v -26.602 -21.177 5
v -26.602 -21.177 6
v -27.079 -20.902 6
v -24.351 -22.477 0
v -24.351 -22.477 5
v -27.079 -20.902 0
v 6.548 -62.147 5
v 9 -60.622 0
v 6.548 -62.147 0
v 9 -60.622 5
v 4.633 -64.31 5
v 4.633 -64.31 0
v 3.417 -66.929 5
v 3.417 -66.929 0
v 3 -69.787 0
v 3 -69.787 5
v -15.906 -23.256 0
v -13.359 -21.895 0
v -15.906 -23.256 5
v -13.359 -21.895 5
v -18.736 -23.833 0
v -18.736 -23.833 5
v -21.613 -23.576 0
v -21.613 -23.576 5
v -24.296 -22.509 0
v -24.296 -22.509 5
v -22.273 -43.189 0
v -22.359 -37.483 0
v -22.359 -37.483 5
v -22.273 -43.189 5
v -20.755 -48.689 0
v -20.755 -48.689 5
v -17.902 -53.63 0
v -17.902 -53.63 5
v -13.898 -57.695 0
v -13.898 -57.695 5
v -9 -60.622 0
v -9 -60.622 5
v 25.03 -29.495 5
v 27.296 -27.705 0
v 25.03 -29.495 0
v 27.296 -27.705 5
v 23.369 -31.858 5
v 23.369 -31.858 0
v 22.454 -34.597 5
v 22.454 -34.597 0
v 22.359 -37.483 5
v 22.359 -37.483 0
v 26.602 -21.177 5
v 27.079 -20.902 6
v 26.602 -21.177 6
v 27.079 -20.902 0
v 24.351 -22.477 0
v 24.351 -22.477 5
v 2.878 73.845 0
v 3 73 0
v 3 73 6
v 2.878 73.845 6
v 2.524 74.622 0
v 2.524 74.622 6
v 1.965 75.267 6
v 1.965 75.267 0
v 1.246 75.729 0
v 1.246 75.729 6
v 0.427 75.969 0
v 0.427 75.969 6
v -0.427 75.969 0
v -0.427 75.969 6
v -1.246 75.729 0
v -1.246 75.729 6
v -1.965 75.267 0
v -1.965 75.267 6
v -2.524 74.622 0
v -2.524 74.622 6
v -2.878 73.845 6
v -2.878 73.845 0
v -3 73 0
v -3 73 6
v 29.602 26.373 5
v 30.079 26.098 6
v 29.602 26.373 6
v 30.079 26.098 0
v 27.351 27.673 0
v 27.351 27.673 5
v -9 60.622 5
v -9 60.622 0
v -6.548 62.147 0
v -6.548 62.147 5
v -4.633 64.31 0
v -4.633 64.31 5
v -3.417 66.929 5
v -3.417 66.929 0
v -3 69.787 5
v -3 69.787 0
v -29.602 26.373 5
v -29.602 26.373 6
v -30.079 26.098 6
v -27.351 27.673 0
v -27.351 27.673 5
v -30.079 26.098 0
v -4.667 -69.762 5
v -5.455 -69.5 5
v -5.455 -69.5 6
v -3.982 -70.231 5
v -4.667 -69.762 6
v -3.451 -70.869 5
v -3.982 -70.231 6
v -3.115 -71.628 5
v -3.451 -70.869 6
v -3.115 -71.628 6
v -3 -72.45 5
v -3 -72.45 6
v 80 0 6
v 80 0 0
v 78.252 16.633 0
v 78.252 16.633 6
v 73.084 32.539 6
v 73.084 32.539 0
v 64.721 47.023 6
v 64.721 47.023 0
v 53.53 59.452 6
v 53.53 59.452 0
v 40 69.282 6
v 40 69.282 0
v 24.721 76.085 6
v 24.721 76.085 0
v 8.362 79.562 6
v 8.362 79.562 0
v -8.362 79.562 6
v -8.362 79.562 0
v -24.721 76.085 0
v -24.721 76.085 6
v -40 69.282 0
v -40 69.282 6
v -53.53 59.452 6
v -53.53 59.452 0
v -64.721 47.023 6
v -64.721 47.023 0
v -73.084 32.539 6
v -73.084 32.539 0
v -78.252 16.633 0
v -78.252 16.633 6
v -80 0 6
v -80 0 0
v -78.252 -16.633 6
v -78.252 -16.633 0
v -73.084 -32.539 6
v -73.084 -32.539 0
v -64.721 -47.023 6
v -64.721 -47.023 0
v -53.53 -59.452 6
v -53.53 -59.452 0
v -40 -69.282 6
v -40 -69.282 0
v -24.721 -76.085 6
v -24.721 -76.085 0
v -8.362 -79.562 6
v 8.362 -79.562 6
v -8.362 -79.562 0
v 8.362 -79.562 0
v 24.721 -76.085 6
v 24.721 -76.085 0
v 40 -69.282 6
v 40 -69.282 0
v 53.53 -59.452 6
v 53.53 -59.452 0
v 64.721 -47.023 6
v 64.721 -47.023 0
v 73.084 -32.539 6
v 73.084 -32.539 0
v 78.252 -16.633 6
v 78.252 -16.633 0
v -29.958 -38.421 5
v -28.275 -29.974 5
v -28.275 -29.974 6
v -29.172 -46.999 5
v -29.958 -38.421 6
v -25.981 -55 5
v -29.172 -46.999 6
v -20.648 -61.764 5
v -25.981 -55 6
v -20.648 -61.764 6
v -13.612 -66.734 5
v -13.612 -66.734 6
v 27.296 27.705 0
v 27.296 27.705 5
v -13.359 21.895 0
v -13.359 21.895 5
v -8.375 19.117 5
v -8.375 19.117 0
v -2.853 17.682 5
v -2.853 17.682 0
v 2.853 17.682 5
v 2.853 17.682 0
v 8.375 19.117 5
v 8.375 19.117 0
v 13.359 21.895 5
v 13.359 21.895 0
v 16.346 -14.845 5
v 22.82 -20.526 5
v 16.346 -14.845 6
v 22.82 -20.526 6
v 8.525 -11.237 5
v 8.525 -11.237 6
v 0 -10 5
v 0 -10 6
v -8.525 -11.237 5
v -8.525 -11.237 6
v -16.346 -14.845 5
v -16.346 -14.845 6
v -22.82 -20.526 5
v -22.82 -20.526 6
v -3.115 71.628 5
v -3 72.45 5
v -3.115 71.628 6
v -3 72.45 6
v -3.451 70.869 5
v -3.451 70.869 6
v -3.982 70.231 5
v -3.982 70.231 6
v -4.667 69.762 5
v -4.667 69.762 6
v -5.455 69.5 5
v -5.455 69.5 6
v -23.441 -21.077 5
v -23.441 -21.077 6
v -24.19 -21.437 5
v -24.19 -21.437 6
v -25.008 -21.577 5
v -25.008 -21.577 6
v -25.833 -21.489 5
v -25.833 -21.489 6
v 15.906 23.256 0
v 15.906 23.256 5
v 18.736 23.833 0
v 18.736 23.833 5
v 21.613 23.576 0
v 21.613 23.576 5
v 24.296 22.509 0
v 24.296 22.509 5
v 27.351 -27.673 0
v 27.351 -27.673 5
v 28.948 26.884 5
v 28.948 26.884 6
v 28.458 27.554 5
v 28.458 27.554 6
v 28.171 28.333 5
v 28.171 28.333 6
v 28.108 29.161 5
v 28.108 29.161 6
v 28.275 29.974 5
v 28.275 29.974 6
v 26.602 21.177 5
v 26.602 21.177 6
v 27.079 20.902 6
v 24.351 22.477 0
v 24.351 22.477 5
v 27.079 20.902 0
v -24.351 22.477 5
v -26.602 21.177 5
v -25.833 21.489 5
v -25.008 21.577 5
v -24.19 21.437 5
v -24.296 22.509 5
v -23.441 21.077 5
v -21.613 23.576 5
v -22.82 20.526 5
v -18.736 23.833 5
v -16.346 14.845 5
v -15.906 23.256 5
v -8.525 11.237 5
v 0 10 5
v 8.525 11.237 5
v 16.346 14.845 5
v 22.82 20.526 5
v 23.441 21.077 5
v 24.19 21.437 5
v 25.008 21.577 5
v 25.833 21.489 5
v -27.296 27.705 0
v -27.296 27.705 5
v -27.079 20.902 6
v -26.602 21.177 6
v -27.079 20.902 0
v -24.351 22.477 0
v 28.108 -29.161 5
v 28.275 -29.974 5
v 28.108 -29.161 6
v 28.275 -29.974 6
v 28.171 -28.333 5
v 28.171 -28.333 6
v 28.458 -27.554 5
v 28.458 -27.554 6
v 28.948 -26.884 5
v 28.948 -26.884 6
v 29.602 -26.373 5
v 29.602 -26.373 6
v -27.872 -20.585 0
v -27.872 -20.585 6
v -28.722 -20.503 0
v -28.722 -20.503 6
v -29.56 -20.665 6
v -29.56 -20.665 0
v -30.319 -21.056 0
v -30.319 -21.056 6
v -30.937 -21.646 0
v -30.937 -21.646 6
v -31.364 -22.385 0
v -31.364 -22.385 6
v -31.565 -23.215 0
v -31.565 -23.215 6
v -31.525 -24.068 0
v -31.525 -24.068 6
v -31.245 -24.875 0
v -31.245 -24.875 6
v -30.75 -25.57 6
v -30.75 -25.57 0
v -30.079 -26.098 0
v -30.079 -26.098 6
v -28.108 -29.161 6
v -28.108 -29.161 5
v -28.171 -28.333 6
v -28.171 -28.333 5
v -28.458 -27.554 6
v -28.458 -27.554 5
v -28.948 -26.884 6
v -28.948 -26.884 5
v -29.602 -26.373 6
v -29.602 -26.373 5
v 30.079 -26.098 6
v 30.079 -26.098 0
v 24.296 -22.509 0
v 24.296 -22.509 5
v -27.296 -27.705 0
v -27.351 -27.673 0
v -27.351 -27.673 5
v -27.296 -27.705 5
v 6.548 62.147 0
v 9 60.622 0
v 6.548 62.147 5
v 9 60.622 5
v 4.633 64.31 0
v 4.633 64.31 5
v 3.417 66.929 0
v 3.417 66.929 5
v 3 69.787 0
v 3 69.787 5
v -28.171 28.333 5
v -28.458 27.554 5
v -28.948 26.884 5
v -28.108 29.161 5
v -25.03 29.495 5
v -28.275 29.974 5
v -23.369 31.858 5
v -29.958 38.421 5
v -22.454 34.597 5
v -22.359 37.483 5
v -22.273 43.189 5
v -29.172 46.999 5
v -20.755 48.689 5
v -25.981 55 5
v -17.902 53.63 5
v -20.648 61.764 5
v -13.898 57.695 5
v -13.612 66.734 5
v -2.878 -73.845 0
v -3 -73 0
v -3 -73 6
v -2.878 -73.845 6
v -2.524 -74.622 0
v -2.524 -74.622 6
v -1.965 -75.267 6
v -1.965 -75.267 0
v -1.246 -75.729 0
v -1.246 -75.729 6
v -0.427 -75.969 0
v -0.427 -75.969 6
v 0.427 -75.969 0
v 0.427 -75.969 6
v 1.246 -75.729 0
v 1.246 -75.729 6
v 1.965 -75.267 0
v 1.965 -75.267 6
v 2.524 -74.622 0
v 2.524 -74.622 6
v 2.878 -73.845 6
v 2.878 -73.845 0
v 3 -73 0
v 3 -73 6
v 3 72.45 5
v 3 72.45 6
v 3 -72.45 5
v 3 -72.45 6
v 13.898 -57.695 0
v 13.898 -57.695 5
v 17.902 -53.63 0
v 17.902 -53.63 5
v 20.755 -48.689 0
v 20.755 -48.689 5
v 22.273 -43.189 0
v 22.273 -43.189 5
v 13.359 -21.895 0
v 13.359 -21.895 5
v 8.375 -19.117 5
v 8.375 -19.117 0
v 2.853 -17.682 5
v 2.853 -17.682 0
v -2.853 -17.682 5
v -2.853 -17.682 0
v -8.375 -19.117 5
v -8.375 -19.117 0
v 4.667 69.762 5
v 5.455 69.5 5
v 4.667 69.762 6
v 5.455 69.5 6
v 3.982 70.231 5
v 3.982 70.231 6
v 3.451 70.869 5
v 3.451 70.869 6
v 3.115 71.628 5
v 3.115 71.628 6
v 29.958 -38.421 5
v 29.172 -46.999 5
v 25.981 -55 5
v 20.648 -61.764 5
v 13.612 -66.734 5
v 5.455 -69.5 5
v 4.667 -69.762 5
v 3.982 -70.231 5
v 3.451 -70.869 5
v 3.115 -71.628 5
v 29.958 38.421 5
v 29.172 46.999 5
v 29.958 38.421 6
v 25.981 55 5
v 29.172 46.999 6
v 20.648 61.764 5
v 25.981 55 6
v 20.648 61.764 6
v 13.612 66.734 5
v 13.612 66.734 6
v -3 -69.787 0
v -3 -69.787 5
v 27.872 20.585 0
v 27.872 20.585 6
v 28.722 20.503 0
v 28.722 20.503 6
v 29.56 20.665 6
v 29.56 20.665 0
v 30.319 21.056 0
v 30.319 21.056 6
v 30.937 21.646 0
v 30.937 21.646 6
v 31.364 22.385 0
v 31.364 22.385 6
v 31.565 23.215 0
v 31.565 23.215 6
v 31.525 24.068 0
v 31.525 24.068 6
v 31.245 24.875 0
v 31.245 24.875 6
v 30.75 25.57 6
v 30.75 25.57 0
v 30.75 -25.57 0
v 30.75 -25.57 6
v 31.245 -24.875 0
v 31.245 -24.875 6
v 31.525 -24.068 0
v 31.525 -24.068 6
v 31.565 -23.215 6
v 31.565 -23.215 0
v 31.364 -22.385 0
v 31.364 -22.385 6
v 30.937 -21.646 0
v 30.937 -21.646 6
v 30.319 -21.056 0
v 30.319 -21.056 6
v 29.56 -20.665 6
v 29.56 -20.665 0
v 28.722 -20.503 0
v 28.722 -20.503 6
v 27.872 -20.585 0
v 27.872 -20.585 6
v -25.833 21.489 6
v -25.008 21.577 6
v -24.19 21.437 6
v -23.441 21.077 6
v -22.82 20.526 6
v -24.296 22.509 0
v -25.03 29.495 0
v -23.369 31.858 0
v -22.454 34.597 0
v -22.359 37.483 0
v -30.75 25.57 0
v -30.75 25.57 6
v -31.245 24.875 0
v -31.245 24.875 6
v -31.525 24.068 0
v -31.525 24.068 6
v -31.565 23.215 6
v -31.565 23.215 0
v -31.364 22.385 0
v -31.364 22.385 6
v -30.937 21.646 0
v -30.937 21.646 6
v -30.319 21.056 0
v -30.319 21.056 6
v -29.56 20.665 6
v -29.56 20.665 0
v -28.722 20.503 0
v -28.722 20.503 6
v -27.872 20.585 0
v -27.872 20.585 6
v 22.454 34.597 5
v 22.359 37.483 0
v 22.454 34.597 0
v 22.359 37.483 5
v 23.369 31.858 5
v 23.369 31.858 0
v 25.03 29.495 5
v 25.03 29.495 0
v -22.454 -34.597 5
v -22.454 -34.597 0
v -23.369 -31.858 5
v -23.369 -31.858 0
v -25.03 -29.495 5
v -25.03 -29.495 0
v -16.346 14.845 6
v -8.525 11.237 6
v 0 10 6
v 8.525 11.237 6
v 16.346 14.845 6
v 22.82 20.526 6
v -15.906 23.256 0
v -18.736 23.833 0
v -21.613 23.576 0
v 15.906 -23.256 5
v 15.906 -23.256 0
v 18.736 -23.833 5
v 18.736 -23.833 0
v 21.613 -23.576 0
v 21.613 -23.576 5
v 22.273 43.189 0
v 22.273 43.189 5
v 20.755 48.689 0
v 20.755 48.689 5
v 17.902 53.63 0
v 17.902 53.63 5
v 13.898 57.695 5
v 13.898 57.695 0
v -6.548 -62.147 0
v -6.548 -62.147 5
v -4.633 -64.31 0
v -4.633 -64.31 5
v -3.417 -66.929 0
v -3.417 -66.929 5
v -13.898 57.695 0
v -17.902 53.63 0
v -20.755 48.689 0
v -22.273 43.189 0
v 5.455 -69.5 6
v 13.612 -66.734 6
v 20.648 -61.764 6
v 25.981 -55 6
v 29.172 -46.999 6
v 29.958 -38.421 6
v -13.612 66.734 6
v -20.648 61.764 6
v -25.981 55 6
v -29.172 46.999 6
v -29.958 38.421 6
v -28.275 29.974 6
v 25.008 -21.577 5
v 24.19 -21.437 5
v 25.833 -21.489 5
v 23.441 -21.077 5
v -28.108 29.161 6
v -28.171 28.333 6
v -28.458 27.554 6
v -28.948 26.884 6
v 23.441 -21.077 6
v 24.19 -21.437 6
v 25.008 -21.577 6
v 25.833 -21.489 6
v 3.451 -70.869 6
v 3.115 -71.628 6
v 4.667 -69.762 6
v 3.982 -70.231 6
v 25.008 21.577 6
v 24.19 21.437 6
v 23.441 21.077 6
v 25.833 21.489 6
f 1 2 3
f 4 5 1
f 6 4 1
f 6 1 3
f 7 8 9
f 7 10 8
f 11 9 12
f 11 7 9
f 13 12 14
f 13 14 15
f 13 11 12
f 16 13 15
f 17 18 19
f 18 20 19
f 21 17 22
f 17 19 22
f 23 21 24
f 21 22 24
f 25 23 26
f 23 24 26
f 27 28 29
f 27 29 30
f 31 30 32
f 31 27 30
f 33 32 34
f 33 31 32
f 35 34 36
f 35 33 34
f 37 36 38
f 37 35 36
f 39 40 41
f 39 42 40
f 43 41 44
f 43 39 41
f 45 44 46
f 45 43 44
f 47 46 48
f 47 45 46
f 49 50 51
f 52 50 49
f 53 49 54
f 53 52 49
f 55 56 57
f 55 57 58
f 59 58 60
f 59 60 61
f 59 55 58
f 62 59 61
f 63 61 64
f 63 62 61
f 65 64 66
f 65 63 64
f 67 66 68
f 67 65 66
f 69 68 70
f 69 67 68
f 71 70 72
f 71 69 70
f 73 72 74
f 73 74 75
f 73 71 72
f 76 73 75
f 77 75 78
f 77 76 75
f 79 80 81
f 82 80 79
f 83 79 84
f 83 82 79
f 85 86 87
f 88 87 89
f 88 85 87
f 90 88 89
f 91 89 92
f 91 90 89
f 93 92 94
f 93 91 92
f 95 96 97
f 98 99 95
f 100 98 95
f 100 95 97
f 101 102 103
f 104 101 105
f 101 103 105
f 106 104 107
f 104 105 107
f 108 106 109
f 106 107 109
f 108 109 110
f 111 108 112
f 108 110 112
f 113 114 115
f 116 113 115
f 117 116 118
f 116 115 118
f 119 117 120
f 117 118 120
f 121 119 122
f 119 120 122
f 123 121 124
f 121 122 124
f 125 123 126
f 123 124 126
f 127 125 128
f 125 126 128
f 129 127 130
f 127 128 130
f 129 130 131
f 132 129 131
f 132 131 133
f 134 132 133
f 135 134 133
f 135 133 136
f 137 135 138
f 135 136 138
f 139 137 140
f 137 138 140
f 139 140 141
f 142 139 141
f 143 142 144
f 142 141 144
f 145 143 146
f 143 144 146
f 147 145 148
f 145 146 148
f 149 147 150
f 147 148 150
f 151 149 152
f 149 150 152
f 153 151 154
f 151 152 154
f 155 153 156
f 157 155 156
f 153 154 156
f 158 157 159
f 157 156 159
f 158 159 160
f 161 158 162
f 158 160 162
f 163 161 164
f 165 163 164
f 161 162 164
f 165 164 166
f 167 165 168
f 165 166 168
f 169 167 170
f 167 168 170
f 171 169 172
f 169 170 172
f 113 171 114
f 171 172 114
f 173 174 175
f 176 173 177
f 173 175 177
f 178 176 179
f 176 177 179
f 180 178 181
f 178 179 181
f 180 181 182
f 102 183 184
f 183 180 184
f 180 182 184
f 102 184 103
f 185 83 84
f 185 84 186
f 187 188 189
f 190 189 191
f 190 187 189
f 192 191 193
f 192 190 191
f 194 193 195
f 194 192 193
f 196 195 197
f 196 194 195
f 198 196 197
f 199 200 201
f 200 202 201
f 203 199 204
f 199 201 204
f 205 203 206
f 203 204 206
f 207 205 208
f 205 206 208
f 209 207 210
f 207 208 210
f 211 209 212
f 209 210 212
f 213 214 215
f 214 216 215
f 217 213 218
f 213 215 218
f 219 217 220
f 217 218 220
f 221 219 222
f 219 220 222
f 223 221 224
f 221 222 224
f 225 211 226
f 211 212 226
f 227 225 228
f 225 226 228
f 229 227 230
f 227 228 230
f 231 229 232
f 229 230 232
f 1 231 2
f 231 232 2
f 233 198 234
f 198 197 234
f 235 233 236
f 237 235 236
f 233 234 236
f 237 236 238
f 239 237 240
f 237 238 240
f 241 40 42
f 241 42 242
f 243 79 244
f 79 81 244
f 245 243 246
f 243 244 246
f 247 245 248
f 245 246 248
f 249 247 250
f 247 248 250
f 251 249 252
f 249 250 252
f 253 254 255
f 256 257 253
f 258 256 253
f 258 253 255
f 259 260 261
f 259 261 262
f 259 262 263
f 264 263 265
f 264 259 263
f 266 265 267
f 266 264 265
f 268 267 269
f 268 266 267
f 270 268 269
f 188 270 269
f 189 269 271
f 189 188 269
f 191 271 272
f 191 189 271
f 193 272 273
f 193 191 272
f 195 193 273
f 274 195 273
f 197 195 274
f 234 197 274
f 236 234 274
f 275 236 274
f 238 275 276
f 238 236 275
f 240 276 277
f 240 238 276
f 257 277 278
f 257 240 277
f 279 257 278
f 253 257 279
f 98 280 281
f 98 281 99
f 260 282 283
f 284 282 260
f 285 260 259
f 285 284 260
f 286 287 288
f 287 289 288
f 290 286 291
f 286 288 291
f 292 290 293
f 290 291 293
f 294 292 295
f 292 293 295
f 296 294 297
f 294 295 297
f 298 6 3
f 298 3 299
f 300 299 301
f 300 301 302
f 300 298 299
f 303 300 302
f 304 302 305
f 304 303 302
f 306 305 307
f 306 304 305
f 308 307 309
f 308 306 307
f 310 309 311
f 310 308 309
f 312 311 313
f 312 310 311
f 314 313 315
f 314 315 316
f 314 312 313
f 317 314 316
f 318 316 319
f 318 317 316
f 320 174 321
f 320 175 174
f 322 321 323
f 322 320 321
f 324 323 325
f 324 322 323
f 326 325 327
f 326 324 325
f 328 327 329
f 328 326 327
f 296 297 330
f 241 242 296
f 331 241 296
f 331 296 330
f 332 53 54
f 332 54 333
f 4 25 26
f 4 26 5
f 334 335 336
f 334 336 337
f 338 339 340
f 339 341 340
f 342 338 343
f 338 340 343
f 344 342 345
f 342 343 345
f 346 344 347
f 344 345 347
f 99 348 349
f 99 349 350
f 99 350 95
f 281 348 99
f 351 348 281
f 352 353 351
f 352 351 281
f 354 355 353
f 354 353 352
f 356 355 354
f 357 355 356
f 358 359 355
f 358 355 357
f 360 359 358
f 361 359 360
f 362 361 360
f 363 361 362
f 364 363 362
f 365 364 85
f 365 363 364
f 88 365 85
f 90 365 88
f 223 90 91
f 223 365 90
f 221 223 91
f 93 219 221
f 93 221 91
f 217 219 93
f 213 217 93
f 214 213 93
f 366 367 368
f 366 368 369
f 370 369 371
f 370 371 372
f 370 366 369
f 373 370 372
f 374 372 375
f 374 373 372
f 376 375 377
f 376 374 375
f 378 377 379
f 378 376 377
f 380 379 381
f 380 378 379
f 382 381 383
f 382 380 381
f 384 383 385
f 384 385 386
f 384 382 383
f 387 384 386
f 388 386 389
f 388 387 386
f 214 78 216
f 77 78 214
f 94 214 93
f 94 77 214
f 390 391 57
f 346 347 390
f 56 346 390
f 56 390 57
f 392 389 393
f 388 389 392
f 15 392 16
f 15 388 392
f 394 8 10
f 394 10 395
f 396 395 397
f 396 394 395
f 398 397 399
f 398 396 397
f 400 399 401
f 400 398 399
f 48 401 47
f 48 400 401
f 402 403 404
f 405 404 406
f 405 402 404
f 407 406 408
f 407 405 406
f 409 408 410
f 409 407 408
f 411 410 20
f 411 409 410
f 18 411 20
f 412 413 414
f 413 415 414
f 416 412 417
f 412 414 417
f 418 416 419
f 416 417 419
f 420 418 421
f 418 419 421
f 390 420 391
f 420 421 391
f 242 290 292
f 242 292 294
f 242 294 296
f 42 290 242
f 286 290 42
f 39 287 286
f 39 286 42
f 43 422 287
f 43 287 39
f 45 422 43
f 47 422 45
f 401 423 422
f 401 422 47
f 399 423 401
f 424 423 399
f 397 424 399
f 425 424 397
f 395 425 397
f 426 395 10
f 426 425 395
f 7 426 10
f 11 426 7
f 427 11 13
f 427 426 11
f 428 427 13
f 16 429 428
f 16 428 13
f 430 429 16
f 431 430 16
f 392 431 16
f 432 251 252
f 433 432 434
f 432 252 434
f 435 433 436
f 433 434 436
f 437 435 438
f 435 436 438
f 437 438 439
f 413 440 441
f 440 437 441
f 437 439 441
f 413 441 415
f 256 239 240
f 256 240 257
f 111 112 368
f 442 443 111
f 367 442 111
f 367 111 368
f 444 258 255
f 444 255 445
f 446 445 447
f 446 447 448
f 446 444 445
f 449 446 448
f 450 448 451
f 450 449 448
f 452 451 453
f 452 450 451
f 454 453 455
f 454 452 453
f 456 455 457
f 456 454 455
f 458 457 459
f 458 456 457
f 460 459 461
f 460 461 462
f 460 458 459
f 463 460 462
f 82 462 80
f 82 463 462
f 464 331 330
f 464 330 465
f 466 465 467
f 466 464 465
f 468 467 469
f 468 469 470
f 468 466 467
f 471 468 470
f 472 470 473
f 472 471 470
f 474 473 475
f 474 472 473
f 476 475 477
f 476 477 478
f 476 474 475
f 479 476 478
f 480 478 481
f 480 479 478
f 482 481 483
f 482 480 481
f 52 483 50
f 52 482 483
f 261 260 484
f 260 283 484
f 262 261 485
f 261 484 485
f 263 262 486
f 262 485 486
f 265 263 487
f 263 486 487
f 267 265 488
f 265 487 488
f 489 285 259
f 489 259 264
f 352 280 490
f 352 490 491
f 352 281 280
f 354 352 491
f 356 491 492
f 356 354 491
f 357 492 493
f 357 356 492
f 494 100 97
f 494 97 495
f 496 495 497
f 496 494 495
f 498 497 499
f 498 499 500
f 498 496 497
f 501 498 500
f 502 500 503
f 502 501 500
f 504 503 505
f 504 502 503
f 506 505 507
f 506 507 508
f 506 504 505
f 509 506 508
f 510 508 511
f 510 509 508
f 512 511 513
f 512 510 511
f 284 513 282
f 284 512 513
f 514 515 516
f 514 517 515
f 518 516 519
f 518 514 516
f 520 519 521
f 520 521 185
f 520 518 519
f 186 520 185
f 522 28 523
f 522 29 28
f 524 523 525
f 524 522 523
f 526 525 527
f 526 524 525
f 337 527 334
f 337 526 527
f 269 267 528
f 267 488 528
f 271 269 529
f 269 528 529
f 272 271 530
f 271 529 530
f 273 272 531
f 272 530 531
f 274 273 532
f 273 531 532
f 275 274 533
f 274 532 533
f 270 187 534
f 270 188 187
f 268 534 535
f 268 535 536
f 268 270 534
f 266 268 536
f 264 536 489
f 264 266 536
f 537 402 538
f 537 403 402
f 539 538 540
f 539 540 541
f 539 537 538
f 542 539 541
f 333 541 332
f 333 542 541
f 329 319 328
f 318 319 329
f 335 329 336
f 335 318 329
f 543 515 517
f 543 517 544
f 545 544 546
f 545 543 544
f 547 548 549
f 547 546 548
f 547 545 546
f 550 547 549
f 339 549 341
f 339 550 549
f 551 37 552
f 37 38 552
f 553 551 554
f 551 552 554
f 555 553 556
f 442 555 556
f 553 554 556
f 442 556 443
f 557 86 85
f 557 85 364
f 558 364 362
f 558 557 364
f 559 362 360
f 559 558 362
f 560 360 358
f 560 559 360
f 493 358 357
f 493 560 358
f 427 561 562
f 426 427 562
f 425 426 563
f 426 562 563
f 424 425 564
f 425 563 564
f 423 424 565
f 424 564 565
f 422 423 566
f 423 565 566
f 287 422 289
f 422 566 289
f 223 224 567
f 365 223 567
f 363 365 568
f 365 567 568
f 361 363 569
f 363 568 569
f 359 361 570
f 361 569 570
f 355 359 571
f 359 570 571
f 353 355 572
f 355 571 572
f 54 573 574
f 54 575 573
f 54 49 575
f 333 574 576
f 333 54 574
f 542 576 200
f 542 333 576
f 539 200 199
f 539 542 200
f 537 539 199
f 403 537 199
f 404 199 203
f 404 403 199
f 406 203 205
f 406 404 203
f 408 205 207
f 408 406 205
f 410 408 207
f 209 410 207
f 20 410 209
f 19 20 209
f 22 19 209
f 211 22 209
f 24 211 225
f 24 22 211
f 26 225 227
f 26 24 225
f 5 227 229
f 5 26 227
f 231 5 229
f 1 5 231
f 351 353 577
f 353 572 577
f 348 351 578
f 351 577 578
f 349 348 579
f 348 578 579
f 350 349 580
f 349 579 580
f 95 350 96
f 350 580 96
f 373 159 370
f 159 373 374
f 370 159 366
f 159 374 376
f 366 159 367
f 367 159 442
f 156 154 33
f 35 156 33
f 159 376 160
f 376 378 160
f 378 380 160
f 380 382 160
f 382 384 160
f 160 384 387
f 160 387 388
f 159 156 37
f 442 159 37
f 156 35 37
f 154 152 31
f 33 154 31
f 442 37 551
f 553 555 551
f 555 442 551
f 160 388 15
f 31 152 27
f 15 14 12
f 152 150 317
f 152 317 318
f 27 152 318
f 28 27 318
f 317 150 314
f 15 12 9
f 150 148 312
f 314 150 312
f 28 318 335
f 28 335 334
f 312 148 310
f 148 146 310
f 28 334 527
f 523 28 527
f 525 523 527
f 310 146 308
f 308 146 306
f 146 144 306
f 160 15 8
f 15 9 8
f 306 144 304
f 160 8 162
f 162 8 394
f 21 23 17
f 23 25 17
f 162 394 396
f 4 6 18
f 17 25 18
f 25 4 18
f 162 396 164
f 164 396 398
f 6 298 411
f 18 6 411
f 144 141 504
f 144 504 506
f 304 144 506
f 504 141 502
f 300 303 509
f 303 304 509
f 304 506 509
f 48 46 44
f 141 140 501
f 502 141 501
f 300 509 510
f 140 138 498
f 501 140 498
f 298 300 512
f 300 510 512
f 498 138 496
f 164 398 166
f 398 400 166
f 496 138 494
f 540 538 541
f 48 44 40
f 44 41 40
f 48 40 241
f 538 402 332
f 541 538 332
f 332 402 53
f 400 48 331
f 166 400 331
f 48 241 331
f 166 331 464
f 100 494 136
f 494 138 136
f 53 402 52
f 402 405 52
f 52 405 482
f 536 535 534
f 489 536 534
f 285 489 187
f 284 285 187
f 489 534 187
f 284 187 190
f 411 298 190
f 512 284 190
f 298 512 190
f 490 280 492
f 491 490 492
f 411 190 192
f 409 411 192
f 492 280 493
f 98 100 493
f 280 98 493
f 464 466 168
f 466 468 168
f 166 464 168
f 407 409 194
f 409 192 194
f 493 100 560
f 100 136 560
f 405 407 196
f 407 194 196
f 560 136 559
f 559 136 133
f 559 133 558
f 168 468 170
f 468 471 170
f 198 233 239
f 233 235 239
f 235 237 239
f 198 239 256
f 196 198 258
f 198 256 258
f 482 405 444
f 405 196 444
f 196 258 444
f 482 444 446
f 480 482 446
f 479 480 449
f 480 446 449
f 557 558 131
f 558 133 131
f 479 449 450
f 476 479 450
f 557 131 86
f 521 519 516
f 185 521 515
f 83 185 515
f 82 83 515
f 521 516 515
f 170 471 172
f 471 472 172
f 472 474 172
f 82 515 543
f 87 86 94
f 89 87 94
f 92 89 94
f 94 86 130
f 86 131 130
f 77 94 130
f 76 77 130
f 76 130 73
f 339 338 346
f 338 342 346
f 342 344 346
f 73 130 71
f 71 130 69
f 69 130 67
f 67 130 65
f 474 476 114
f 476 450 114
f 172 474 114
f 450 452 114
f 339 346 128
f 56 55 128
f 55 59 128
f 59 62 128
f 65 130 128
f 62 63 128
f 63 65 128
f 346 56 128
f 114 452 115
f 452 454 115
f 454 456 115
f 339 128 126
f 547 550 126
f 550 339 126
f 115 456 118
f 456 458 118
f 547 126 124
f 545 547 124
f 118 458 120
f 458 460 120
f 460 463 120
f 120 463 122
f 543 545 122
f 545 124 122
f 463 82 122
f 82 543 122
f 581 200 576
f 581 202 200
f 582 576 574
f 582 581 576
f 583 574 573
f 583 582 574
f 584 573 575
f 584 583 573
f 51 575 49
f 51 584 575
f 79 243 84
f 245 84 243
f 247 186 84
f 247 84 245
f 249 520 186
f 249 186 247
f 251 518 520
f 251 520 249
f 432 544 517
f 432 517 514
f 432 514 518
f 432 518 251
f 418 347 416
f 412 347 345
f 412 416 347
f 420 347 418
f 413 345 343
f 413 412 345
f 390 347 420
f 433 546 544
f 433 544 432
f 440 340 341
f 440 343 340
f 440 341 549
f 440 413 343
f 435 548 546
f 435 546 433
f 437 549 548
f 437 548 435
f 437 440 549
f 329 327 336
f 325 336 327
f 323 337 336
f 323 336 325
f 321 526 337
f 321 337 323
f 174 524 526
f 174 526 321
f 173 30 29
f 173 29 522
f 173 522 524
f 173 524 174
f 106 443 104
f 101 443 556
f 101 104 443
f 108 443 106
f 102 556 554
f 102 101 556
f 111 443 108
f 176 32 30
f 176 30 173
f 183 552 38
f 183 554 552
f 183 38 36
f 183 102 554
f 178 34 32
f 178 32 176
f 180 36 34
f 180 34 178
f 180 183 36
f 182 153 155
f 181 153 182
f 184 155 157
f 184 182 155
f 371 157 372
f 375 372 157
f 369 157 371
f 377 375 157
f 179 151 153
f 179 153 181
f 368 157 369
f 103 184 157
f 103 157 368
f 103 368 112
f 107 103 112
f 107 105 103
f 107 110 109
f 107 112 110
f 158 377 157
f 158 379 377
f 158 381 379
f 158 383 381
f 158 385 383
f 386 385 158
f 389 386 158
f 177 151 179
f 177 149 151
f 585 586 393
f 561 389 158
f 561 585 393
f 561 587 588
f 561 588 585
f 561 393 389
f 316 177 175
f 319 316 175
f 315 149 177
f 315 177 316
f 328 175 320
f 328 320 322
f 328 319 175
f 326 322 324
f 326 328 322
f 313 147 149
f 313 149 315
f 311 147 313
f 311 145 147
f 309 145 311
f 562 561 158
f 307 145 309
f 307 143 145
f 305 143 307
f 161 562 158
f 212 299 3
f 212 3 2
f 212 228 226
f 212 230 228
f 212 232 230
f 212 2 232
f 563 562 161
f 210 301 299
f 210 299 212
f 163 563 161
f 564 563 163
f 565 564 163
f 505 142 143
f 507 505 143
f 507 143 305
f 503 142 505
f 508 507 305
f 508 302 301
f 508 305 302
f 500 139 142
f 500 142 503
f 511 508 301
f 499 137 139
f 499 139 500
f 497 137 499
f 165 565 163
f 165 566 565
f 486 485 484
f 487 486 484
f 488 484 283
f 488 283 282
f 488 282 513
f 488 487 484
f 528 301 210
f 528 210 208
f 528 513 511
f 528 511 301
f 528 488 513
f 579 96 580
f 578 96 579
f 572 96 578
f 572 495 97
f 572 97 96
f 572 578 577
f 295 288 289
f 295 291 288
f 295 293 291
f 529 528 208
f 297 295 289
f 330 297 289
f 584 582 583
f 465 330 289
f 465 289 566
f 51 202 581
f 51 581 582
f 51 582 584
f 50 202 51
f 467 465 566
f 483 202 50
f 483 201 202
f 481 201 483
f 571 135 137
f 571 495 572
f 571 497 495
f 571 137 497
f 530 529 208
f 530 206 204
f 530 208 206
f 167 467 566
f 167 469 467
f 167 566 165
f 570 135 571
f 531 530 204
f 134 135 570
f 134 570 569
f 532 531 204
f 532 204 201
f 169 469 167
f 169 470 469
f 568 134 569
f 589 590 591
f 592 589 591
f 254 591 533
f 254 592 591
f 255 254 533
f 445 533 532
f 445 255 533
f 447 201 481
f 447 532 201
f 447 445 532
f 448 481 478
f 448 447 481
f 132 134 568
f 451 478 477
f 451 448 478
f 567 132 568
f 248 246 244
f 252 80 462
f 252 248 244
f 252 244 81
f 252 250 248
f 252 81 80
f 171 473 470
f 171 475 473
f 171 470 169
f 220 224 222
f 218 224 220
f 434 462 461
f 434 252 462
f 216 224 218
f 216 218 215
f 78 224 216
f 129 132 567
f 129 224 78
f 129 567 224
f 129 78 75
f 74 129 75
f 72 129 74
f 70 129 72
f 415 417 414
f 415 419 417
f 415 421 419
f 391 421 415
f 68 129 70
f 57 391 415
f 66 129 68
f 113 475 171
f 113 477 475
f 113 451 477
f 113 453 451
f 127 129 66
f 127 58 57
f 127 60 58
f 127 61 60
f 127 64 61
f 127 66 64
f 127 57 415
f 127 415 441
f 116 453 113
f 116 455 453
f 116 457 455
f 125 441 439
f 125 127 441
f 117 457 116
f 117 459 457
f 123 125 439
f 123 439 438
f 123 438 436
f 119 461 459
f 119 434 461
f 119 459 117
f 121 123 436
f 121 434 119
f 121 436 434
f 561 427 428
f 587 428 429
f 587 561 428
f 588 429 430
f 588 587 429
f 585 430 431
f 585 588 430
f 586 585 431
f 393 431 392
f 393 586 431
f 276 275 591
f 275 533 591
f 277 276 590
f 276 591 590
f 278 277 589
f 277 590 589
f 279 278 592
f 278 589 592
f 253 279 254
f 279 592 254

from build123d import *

# Parameters (mm, degrees)
SKETCH2_R                = 80
BOSS_EXTRUDE1_DEPTH      = 6
CUT_EXTRUDE2_DEPTH       = 6
SKETCH3_R                = 30
CUT_EXTRUDE3_DEPTH       = 1
FILLET1_R                = 3
FILLET2_R                = 10
CIRPATTERN1_COUNT        = 2
FILLET1_OF_CIRPATTERN1_R = 3
FILLET2_OF_CIRPATTERN1_R = 10


with BuildPart() as part:
    # Sketch2 → Boss-Extrude1 (new body)
    with BuildSketch(Plane.XY):
        Circle(SKETCH2_R)
    extrude(amount=BOSS_EXTRUDE1_DEPTH)

    # Sketch1 → Cut-Extrude2 (cut)
    with BuildSketch(Plane.XY):
        with BuildLine():
            ThreePointArc((3, 73), (0, 76), (-3, 73))
            Line((-3, 73), (-3, 62.299103121))
            ThreePointArc((-3, 62.299103121), (-19.485571585, 51.25), (-20.811589784, 31.448524651))
            Line((-20.811589784, 31.448524651), (-30.078838325, 26.098076211))
            ThreePointArc((-30.078838325, 26.098076211), (-31.176914536, 22), (-27.078838325, 20.901923789))
            Line((-27.078838325, 20.901923789), (-17.811589784, 26.252372228))
            ThreePointArc((-17.811589784, 26.252372228), (0, 17.5), (17.811589784, 26.252372228))
            Line((17.811589784, 26.252372228), (27.078838325, 20.901923789))
            ThreePointArc((27.078838325, 20.901923789), (31.176914536, 22), (30.078838325, 26.098076211))
            Line((30.078838325, 26.098076211), (20.811589784, 31.448524651))
            ThreePointArc((20.811589784, 31.448524651), (19.485571585, 51.25), (3, 62.299103121))
            Line((3, 62.299103121), (3, 73))
        make_face()
    cut_extrude2 = extrude(amount=CUT_EXTRUDE2_DEPTH, mode=Mode.SUBTRACT)

    # Sketch3 → Cut-Extrude3 (cut)
    with BuildSketch(Plane.XY.offset(6)):
        with Locations((0, 40)):
            Circle(SKETCH3_R)
    cut_extrude3 = extrude(amount=-CUT_EXTRUDE3_DEPTH, mode=Mode.SUBTRACT)

    # Fillet1
    fillet1_edges = [part.edges().sort_by_distance(p)[0] for p in [
        (24.350531909, 22.477112232, 5.5),
        (-24.350531909, 22.477112232, 5.5),
        (-27.350531909, 27.673264655, 5.5),
        (-3, 69.849623113, 5.5),
        (27.350531909, 27.673264655, 5.5),
        (3, 69.849623113, 5.5),
    ]]
    fillet(fillet1_edges, radius=FILLET1_R)

    # Fillet2
    fillet2_edges = [part.edges().sort_by_distance(p)[0] for p in [
        (-3, 62.299103121, 2.5),
        (-20.811589784, 31.448524651, 2.5),
        (-17.811589784, 26.252372228, 2.5),
        (17.811589784, 26.252372228, 2.5),
        (20.811589784, 31.448524651, 2.5),
        (3, 62.299103121, 2.5),
    ]]
    fillet(fillet2_edges, radius=FILLET2_R)

    # CirPattern1: Cut-Extrude2, Cut-Extrude3 ×2 about axis
    cirpattern1_axis = Axis((0, 0, 6), (0, 0, -1))
    add([cut_extrude2.rotate(cirpattern1_axis, i * 360 / CIRPATTERN1_COUNT) for i in range(1, CIRPATTERN1_COUNT)], mode=Mode.SUBTRACT)
    add([cut_extrude3.rotate(cirpattern1_axis, i * 360 / CIRPATTERN1_COUNT) for i in range(1, CIRPATTERN1_COUNT)], mode=Mode.SUBTRACT)

    # Fillet1 of CirPattern1
    fillet1_of_cirpattern1_edges = [part.edges().sort_by_distance(p)[0] for p in [
        (-24.350531909, -22.477112232, 5.5),
        (24.350531909, -22.477112232, 5.5),
        (27.350531909, -27.673264655, 5.5),
        (3, -69.849623113, 5.5),
        (-27.350531909, -27.673264655, 5.5),
        (-3, -69.849623113, 5.5),
    ]]
    fillet(fillet1_of_cirpattern1_edges, radius=FILLET1_OF_CIRPATTERN1_R)

    # Fillet2 of CirPattern1
    fillet2_of_cirpattern1_edges = [part.edges().sort_by_distance(p)[0] for p in [
        (3, -62.299103121, 2.5),
        (20.811589784, -31.448524651, 2.5),
        (17.811589784, -26.252372228, 2.5),
        (-17.811589784, -26.252372228, 2.5),
        (-20.811589784, -31.448524651, 2.5),
        (-3, -62.299103121, 2.5),
    ]]
    fillet(fillet2_of_cirpattern1_edges, radius=FILLET2_OF_CIRPATTERN1_R)


solid = part.part
